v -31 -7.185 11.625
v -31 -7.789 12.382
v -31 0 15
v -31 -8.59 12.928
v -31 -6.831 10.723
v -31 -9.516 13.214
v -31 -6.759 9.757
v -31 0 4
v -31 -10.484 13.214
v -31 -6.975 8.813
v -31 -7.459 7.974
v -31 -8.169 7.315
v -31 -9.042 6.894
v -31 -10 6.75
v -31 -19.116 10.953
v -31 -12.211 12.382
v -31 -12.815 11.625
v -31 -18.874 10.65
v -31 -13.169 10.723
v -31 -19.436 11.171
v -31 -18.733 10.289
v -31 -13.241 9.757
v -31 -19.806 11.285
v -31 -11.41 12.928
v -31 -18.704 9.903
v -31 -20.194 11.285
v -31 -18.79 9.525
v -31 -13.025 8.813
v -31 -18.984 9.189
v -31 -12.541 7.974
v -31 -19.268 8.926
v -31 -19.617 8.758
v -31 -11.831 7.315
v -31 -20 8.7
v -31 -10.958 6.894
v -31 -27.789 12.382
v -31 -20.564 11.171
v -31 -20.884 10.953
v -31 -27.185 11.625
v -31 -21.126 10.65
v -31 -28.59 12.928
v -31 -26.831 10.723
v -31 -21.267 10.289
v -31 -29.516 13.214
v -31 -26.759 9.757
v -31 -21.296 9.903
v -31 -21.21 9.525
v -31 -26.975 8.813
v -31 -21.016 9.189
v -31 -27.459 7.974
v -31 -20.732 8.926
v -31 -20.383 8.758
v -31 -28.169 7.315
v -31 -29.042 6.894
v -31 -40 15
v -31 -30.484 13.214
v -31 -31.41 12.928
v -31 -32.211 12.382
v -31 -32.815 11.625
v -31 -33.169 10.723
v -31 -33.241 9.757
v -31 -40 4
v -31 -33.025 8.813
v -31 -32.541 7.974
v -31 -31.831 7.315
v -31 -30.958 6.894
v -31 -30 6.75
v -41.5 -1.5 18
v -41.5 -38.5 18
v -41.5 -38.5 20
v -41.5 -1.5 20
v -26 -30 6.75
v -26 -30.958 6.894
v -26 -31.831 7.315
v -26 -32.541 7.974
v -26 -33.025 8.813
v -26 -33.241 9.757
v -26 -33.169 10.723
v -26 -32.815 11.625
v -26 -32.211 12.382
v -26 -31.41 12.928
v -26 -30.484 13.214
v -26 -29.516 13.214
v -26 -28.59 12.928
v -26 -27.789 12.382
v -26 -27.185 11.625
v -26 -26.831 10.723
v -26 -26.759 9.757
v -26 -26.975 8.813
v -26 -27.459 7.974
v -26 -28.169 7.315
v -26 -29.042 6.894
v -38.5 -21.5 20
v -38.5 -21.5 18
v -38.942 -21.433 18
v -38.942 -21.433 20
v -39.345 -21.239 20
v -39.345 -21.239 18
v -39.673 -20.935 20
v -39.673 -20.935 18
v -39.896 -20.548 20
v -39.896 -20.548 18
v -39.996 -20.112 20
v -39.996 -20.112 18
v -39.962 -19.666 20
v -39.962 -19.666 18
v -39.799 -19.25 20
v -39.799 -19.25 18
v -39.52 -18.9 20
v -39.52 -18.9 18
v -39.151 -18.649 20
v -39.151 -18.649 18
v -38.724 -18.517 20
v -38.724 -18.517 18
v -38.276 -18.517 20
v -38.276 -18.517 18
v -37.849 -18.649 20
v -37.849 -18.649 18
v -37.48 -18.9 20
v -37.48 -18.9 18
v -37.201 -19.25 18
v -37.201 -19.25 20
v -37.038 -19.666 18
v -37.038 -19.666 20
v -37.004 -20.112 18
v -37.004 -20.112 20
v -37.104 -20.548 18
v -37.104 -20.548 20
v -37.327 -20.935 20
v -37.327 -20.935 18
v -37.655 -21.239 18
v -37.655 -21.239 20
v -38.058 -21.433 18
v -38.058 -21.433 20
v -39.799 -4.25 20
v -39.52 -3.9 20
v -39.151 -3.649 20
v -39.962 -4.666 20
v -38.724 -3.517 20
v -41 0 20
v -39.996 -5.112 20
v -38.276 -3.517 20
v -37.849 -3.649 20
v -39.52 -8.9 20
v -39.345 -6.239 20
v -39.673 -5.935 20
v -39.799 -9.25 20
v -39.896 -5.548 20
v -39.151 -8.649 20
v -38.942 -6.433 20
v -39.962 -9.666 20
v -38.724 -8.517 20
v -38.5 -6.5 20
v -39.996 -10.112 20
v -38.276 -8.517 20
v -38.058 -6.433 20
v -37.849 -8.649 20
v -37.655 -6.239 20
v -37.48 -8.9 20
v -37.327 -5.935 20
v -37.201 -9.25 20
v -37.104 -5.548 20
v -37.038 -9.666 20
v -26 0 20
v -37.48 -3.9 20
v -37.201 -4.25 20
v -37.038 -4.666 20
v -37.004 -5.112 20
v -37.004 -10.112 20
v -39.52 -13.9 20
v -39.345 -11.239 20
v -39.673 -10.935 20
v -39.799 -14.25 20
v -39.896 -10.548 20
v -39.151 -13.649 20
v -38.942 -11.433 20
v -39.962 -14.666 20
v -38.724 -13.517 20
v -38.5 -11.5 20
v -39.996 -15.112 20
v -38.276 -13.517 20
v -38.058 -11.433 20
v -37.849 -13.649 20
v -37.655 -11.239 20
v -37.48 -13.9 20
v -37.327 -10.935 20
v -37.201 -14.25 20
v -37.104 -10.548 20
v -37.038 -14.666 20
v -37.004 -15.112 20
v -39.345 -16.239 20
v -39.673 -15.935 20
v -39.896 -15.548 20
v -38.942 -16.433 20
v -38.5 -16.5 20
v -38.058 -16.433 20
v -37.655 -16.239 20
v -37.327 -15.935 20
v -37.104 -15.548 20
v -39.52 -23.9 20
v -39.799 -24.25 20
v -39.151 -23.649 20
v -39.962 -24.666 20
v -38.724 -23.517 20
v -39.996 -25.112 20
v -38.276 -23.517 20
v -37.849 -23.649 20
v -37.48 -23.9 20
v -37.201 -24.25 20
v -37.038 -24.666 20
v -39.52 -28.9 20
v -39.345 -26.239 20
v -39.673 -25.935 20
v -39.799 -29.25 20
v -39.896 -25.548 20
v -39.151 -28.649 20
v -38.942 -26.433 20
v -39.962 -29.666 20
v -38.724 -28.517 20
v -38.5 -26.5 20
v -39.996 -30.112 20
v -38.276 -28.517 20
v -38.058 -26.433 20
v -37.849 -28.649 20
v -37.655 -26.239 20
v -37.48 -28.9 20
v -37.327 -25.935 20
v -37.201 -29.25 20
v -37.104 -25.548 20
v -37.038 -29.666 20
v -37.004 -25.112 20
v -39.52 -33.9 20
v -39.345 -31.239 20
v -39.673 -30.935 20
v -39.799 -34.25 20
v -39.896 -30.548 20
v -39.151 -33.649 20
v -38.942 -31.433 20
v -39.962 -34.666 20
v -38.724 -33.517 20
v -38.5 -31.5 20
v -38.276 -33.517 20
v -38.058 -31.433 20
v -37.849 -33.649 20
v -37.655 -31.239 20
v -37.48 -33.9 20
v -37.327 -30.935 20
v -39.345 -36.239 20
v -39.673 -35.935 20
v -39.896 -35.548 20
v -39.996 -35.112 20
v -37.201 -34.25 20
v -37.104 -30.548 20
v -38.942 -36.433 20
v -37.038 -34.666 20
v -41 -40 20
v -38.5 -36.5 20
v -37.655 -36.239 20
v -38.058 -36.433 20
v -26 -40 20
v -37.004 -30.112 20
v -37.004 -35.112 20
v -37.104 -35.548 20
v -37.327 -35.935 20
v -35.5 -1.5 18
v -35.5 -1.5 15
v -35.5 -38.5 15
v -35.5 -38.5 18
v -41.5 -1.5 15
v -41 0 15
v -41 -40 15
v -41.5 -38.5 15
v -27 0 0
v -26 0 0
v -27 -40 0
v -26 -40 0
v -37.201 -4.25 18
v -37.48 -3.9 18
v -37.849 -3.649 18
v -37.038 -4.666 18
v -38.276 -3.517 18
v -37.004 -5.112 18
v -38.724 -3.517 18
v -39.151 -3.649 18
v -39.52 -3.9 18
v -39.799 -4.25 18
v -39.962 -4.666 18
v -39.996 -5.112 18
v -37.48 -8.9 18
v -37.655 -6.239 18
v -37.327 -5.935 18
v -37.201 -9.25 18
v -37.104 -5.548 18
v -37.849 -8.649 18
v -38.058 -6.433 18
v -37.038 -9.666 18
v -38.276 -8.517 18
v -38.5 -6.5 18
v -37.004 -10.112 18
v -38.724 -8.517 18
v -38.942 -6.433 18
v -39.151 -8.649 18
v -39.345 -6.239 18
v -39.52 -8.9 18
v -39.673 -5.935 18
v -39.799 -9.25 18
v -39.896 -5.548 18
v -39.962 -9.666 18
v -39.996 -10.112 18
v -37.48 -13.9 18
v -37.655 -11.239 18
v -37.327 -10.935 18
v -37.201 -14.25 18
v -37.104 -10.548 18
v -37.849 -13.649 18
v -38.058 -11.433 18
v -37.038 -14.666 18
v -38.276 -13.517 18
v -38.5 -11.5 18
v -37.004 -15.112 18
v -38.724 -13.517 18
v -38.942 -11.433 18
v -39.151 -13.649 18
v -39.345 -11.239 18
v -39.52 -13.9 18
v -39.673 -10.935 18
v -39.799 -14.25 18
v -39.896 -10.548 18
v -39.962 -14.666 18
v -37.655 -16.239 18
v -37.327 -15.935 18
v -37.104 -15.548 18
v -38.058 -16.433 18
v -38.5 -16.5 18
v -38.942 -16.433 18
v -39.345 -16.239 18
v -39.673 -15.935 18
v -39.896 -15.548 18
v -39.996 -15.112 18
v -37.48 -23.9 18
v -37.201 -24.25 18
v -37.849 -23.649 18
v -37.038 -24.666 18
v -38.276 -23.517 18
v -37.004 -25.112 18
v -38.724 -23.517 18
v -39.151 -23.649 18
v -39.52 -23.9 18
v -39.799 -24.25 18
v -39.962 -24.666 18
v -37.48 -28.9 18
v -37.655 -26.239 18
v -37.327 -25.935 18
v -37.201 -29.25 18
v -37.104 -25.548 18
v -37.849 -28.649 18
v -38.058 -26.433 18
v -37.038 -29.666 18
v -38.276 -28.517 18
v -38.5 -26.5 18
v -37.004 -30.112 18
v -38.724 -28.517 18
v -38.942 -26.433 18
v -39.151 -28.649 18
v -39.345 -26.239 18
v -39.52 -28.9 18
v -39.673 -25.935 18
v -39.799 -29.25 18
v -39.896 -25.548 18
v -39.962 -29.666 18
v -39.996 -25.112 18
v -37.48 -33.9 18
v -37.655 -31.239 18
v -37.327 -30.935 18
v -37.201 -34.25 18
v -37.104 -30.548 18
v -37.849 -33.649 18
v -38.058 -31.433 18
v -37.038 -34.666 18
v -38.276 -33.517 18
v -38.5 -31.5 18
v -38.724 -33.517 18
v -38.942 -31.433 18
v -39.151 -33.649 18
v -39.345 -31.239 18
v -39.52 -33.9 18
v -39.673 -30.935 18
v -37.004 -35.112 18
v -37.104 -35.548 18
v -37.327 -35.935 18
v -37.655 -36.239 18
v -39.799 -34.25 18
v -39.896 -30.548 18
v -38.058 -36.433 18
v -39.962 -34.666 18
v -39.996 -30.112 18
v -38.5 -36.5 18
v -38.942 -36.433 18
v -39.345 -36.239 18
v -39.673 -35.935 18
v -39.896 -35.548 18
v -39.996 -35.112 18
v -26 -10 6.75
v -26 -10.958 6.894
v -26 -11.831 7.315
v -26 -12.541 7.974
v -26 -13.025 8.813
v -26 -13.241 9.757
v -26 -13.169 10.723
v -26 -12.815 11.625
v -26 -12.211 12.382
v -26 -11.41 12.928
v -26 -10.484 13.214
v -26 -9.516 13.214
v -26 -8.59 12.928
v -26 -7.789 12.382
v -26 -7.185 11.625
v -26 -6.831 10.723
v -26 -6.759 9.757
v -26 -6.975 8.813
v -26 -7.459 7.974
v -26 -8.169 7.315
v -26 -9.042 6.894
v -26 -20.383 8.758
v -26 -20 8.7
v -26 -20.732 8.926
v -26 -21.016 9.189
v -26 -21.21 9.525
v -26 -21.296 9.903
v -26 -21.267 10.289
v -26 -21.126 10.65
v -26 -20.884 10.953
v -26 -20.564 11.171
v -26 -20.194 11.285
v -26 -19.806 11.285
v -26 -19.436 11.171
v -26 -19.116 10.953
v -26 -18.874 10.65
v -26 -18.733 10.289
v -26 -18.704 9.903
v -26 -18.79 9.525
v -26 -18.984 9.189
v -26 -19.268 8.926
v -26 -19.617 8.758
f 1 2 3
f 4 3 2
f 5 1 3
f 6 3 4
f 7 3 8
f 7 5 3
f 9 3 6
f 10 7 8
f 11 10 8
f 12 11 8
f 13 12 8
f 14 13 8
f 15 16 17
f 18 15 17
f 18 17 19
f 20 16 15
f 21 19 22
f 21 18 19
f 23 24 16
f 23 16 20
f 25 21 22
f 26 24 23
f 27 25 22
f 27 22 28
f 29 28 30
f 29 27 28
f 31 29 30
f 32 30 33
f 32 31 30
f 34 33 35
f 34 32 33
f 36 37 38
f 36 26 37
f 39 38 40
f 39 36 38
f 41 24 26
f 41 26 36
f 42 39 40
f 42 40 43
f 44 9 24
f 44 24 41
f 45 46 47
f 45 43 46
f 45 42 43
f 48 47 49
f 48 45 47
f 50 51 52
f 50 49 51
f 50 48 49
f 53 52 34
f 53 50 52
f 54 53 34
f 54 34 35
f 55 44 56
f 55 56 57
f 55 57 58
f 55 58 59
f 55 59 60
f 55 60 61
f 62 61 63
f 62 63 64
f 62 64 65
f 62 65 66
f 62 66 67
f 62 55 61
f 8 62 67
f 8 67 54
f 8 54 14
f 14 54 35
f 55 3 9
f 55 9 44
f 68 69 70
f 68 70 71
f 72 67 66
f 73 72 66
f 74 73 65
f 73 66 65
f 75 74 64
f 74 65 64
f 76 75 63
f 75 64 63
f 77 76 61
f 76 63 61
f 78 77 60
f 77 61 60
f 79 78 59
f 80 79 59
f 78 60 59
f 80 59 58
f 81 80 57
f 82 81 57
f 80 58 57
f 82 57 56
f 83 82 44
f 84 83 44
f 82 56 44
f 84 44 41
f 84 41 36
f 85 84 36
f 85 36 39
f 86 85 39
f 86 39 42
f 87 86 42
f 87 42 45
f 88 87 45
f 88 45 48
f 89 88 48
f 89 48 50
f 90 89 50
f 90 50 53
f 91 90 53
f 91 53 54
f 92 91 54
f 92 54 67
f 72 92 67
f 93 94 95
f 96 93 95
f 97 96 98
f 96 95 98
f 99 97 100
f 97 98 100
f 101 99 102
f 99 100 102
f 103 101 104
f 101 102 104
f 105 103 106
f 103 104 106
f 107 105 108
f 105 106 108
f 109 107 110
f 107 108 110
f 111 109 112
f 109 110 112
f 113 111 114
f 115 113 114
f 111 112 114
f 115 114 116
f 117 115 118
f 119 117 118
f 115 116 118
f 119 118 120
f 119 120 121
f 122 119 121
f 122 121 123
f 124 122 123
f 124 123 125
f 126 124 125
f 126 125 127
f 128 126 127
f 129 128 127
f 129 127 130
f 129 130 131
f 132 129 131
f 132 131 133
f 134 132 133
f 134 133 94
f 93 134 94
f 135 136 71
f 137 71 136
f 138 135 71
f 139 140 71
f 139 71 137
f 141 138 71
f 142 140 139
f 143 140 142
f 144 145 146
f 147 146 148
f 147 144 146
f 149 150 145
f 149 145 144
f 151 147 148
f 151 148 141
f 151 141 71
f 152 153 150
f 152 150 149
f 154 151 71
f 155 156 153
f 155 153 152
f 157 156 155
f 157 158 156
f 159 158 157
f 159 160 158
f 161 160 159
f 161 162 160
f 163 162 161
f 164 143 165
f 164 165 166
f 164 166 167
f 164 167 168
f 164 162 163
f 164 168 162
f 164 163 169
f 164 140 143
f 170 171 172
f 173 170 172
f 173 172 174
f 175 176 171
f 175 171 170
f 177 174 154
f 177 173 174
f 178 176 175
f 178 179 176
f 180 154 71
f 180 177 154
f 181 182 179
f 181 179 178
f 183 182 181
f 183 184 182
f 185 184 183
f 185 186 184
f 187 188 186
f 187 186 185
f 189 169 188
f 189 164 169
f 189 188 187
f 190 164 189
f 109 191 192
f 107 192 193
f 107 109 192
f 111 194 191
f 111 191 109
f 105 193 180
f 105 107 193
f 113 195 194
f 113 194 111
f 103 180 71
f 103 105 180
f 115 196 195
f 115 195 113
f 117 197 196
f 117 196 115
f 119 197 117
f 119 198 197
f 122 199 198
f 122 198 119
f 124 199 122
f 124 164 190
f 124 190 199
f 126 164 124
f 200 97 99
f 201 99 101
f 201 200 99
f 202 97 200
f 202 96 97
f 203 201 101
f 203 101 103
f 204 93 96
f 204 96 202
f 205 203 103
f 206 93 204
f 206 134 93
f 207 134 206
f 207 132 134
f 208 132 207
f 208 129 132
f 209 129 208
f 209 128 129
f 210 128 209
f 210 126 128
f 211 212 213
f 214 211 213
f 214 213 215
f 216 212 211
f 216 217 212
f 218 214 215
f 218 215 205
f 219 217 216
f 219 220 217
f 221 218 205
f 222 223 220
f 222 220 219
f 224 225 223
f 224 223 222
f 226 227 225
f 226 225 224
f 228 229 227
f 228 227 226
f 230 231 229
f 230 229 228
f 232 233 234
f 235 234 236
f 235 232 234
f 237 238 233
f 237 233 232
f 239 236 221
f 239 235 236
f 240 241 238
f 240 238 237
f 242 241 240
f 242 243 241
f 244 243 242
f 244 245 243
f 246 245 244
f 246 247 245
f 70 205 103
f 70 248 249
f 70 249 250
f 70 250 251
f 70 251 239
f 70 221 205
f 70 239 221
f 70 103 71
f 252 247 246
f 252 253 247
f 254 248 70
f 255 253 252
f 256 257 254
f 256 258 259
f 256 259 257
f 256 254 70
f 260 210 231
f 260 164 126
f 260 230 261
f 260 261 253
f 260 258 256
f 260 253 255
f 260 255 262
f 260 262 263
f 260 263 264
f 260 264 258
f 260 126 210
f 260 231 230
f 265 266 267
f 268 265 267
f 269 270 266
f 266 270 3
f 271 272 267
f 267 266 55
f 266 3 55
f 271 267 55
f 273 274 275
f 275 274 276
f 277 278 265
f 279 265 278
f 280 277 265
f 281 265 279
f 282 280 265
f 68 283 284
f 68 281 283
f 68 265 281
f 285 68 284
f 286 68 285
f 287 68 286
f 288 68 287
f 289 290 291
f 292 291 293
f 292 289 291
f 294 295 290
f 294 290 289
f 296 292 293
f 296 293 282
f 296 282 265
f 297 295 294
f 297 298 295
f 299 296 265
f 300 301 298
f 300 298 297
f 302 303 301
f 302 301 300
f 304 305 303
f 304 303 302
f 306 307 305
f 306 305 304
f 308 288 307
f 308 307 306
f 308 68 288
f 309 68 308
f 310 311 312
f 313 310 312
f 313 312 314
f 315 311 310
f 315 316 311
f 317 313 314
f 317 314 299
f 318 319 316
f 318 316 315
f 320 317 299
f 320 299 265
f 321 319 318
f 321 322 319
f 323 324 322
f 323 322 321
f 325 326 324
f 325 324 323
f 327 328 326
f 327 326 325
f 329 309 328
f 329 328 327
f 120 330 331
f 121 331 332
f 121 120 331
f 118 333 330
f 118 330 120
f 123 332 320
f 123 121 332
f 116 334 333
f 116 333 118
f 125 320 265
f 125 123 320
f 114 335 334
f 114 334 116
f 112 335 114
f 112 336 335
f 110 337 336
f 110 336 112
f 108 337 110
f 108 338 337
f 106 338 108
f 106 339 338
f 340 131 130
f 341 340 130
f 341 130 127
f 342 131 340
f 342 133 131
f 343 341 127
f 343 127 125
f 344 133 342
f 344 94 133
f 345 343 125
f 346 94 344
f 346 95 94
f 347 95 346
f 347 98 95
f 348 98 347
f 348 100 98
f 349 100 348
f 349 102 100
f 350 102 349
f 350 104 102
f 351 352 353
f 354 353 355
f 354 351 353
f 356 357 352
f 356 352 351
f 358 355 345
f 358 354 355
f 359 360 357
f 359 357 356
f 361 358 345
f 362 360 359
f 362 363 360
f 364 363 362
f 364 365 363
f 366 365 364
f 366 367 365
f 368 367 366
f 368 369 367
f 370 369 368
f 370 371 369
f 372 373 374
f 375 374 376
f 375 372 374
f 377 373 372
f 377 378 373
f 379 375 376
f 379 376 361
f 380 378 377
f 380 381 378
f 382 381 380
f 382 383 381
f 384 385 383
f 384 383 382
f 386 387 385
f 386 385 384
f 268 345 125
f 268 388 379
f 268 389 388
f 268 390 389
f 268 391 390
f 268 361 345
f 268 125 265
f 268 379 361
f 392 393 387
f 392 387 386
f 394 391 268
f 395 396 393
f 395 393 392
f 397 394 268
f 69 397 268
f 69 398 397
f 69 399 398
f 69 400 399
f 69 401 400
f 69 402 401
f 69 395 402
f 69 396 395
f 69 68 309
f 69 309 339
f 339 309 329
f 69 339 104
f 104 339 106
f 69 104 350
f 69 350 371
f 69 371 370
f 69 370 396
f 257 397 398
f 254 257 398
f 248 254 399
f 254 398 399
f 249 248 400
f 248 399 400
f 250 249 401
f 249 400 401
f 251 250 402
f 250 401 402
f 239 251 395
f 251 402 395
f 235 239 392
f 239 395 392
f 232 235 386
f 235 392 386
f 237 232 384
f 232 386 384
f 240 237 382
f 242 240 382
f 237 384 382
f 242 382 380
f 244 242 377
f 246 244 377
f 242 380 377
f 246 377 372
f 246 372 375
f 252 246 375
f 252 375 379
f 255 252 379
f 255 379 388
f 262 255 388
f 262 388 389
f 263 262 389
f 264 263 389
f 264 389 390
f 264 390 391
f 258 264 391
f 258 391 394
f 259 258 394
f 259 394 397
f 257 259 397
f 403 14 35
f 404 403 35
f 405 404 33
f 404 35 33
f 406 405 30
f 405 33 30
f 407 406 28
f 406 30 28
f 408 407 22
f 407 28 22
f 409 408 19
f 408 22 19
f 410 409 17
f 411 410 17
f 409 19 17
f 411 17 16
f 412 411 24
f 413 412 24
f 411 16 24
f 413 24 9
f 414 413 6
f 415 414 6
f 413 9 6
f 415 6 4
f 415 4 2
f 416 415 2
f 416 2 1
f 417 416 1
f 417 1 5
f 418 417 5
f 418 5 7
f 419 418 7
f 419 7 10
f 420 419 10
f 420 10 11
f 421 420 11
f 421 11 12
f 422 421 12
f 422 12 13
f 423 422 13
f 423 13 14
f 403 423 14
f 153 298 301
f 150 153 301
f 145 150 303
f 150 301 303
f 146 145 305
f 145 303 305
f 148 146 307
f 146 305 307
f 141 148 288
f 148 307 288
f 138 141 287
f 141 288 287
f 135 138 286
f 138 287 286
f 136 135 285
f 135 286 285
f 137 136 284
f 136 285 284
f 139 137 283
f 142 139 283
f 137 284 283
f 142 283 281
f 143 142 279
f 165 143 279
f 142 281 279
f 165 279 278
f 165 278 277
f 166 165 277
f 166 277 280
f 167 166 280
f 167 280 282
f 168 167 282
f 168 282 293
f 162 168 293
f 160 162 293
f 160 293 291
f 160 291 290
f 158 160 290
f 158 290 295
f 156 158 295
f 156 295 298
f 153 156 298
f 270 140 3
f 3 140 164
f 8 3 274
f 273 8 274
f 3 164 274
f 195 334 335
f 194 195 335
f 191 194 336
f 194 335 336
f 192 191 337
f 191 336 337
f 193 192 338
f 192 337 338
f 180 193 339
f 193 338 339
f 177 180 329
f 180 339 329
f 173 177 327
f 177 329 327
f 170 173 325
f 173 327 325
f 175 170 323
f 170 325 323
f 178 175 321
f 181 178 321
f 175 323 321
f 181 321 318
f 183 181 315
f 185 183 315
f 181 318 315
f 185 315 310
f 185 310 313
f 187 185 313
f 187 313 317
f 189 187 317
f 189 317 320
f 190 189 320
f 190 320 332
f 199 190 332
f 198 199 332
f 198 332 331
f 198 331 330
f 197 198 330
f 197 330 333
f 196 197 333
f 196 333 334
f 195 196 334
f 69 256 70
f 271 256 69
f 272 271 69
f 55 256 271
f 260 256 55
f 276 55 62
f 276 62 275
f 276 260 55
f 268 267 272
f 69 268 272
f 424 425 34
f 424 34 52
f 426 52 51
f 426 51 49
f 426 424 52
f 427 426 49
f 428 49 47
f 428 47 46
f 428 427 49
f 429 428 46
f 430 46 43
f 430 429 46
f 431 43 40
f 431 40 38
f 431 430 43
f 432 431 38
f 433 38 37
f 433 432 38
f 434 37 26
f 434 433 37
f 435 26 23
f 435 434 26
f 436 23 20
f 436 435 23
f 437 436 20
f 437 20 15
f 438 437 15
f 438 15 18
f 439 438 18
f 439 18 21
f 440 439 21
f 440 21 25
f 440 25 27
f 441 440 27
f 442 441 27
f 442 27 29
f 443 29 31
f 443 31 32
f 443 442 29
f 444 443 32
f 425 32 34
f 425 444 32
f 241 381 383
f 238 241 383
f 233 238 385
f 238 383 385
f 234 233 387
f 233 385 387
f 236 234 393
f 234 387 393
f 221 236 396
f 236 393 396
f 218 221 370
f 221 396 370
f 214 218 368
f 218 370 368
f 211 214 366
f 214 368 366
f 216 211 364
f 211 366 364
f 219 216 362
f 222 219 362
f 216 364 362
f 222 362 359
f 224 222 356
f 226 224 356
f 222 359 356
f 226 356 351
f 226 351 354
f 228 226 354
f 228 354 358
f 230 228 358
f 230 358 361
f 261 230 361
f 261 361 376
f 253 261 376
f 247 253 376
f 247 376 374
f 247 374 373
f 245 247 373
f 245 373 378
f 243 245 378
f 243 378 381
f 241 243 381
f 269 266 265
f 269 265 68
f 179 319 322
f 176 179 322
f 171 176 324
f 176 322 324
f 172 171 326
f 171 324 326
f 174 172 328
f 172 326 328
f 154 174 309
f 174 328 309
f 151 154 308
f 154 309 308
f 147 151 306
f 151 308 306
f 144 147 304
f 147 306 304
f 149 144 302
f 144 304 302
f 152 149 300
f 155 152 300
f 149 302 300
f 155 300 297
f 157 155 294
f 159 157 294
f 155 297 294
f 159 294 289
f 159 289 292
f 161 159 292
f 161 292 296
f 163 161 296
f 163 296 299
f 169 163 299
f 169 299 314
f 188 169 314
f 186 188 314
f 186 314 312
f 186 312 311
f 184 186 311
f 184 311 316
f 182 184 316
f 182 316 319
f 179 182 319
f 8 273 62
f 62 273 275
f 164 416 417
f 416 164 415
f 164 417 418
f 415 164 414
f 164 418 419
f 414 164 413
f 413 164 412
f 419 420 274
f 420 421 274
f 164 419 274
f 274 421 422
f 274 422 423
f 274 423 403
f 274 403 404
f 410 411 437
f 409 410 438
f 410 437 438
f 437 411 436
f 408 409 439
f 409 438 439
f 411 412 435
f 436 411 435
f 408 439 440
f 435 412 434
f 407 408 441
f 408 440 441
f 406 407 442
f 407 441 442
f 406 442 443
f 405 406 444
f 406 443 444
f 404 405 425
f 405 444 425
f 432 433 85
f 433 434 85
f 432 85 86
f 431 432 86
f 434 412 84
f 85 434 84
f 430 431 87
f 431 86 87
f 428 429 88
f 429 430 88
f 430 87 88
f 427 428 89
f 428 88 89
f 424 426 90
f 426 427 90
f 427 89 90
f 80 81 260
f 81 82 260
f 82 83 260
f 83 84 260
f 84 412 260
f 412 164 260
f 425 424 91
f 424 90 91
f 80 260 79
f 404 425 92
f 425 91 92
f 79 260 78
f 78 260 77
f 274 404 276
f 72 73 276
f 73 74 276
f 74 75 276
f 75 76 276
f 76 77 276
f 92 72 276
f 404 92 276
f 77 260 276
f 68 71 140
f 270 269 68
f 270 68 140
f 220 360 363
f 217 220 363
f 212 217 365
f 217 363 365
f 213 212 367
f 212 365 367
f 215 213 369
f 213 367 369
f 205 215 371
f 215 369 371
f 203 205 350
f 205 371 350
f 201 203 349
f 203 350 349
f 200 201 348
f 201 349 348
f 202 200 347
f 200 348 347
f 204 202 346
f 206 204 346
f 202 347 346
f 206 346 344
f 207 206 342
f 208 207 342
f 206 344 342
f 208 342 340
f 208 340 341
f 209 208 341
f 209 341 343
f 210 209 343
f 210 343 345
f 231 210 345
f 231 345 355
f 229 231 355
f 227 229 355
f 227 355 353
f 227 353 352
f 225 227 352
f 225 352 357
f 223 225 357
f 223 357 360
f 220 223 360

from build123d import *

# Parameters (mm, degrees)
SKETCH008_W     = 20
SKETCH008_H     = 40
SKETCH008_R     = 2.75
SKETCH008_R_2   = 1.3
PAD004_DEPTH    = 5
SKETCH009_W     = 5
SKETCH009_H     = 40
PAD005_DEPTH    = 15
SKETCH010_R     = 1.5
POCKET004_DEPTH = 5.001
SKETCH011_W     = 37
SKETCH011_H     = 6
POCKET005_DEPTH = 3
CHAMFER007_SIZE = 2
CHAMFER008_SIZE = 4
CHAMFER009_SIZE = 5
POCKET007_DEPTH = 5
SKETCH018_R     = 3.25
POCKET011_DEPTH = 7
SKETCH019_W     = 2
SKETCH019_H     = 2
POCKET012_DEPTH = 40.001


with BuildPart() as part:
    # Sketch008 (on DatumPlane) → Pad004 (new body)
    with BuildSketch(Plane(origin=(-5, 0, 20), x_dir=(0, 0, -1), z_dir=(-1, 0, 0))):
        with Locations((10, 20)):
            Rectangle(SKETCH008_W, SKETCH008_H)
        with Locations((10, 30)):
            Circle(SKETCH008_R, mode=Mode.SUBTRACT)
        with Locations((10, 10)):
            Circle(SKETCH008_R, mode=Mode.SUBTRACT)
        with Locations((10, 20)):
            Circle(SKETCH008_R_2, mode=Mode.SUBTRACT)
    extrude(amount=PAD004_DEPTH)

    # Sketch009 (on Face9 of Pad004) → Pad005 (join)
    with BuildSketch(Plane(origin=(-10, 0, 20), x_dir=(0, 0, -1), z_dir=(-1, 0, 0))):
        with Locations((2.5, 20)):
            Rectangle(SKETCH009_W, SKETCH009_H)
    extrude(amount=PAD005_DEPTH)

    # Sketch010 (on Face7 of Pad005) → Pocket004 (cut, through all)
    with BuildSketch(Plane(origin=(-5, 0, 15), x_dir=(0, -1, 0), z_dir=(0, 0, -1))):
        with Locations((5, 12.5)):
            Circle(SKETCH010_R)
        with Locations((10, 12.5)):
            Circle(SKETCH010_R)
        with Locations((15, 12.5)):
            Circle(SKETCH010_R)
        with Locations((20, 12.5)):
            Circle(SKETCH010_R)
        with Locations((25, 12.5)):
            Circle(SKETCH010_R)
        with Locations((30, 12.5)):
            Circle(SKETCH010_R)
        with Locations((35, 12.5)):
            Circle(SKETCH010_R)
    extrude(amount=-POCKET004_DEPTH, mode=Mode.SUBTRACT)

    # Sketch011 (on Face18 of Pocket004) → Pocket005 (cut)
    with BuildSketch(Plane(origin=(-5, 0, 15), x_dir=(0, -1, 0), z_dir=(0, 0, -1))):
        with Locations((20, 12.5)):
            Rectangle(SKETCH011_W, SKETCH011_H)
    extrude(amount=-POCKET005_DEPTH, mode=Mode.SUBTRACT)

    # Chamfer007
    chamfer007_edges = [part.edges().sort_by_distance(p)[0] for p in [
        (-10, -20, 15),
    ]]
    chamfer(chamfer007_edges, length=CHAMFER007_SIZE)

    # Chamfer008
    chamfer008_edges = [part.edges().sort_by_distance(p)[0] for p in [
        (-10, -20, 0),
    ]]
    chamfer(chamfer008_edges, length=CHAMFER008_SIZE)

    # Chamfer009
    chamfer009_edges = [part.edges().sort_by_distance(p)[0] for p in [
        (-25, 0, 17.5),
        (-25, -40, 17.5),
    ]]
    chamfer(chamfer009_edges, length=CHAMFER009_SIZE)

    # Sketch012 (on Face2 of Chamfer009) → Pocket007 (cut)
    with BuildSketch(Plane(origin=(-5, 0, 15), x_dir=(0, -1, 0), z_dir=(0, 0, -1))):
        Polygon((0, 15), (5, 20), (35, 20), (40, 15), (38.5, 15.5), (1.5, 15.5), align=None)
    extrude(amount=-POCKET007_DEPTH, mode=Mode.SUBTRACT)

    # Sketch018 (on Face6 of Pocket007) → Pocket011 (cut)
    with BuildSketch(Plane(origin=(-10, 0, 20), x_dir=(0, 0, -1), z_dir=(-1, 0, 0))):
        with Locations((10, 30)):
            Circle(SKETCH018_R)
        with Locations((10, 10)):
            Circle(SKETCH018_R)
    extrude(amount=-POCKET011_DEPTH, mode=Mode.SUBTRACT)

    # Sketch019 (on Face1 of Pocket011) → Pocket012 (cut, through all)
    with BuildSketch(Plane(origin=(-5, 0, 20), x_dir=(0, 0, -1), z_dir=(0, 1, 0))):
        with Locations((6, 6)):
            Rectangle(SKETCH019_W, SKETCH019_H)
    extrude(amount=-POCKET012_DEPTH, mode=Mode.SUBTRACT)


with BuildPart() as part_1:
    # Body003 placement: moved
    add(part.part.moved(Location((-21, 0, 0))))


solid = part_1.part
